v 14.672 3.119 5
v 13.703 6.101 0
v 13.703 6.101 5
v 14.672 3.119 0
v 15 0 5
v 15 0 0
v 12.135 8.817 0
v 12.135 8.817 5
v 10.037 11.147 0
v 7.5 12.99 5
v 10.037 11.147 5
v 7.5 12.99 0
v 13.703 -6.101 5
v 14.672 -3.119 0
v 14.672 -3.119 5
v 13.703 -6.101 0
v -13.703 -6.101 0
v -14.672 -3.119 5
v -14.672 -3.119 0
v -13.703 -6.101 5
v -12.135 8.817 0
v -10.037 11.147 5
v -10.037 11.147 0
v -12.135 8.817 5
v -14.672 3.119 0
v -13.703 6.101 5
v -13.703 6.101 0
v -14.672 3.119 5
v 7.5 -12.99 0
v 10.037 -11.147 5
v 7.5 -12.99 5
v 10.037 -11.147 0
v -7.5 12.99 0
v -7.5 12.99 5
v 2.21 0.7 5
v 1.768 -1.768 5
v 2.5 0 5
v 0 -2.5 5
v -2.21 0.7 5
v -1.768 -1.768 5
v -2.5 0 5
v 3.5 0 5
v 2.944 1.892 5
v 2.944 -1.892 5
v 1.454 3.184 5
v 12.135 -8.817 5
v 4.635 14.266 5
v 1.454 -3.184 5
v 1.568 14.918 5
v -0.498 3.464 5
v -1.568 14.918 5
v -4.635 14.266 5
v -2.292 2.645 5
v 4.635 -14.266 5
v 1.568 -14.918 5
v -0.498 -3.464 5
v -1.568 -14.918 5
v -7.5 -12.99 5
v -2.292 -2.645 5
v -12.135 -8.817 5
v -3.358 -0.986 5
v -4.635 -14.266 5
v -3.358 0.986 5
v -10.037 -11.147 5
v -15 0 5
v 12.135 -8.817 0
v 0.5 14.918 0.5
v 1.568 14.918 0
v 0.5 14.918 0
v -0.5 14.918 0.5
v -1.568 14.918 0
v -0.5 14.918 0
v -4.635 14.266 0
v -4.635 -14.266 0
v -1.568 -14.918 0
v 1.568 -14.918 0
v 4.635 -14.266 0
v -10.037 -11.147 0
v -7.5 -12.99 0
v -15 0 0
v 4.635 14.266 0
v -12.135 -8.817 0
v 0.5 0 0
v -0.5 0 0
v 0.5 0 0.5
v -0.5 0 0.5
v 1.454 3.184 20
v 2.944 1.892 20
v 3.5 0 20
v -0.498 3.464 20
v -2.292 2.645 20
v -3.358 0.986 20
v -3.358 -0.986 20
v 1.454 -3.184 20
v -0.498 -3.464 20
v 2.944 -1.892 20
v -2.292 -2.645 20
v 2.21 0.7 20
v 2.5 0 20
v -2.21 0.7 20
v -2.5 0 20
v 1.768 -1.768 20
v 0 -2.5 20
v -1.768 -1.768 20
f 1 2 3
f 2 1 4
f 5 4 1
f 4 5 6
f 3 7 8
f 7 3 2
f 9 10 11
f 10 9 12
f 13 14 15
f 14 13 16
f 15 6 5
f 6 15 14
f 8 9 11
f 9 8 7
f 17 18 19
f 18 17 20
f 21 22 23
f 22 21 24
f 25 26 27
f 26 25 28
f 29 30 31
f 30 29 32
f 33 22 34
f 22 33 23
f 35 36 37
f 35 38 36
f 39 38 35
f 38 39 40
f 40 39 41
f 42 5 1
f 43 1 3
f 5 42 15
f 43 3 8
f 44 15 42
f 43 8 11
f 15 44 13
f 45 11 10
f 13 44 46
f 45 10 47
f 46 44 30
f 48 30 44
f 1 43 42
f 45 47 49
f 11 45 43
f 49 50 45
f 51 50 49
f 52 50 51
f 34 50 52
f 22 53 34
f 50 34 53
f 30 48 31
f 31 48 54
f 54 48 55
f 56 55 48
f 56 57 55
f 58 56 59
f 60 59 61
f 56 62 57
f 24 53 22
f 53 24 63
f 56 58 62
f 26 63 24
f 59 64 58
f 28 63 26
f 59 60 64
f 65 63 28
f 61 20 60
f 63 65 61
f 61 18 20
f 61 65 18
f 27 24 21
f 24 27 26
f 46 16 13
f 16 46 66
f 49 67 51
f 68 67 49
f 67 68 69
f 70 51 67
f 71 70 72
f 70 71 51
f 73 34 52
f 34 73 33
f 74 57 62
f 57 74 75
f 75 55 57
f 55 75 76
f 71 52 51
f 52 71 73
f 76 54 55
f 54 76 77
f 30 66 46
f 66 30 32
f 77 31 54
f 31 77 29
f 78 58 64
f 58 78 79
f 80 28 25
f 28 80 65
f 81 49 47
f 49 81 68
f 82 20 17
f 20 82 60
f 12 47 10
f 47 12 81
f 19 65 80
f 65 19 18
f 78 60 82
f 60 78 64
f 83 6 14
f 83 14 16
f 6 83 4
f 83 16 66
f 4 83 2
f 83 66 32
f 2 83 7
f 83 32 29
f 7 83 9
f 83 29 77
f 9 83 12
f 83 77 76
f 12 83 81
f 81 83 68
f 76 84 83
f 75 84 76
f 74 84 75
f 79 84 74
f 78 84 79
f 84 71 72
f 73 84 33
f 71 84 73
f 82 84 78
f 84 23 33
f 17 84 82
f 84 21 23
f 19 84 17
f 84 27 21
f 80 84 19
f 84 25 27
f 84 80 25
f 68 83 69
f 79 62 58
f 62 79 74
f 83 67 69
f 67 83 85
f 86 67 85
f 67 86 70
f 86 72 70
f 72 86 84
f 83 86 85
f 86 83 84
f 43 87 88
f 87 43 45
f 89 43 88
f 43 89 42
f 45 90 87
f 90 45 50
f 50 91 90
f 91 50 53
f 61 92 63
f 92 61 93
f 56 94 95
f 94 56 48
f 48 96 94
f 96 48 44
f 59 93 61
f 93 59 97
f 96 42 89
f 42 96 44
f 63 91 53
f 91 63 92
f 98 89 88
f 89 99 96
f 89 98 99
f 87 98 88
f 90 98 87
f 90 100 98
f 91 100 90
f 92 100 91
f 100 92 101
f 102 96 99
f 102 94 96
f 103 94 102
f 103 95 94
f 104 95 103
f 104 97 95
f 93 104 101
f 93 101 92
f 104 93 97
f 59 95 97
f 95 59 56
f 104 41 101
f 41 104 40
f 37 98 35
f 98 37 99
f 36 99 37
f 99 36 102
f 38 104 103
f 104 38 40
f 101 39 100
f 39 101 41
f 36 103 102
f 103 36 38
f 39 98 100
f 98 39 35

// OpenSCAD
knob_thickness = 5;
knob_radius = 15;
knob_line_width = 1;

shaft_length = 15;
shaft_outer_radius = 3.5;
shaft_thickness = 1;
shaft_fill = 0.4;


module knob()
{
    handle(knob_radius, knob_thickness, knob_line_width);

    translate([0,0,knob_thickness]) {
        shaft(shaft_outer_radius, shaft_length, shaft_thickness, shaft_fill);
    }
}

module handle(radius, height, line_width)
{

    difference() {
        cylinder(r=radius, h=height);
        translate([0,radius/2,0]) {
            cube([line_width, radius, line_width], center=true);
        }
    }

}

module shaft(radius, length, wall_thickness, shaft_fill)
{
    difference() {
        cylinder(r=radius, h=length);
        cylinder(r=radius - wall_thickness, h=length+0.1);
    }

    intersection() {
        cylinder(r=radius, h=length);

        translate([-radius,(shaft_fill - 0.5) * -radius*2,0]) {
            cube([radius*2, radius*2, length]);
        }
    }
}

knob();

// Written by John Meagher <3d@jmeagher.net>
//
// To the extent possible under law, the author(s) have dedicated all
// copyright and related and neighboring rights to this software to the
// public domain worldwide. This software is distributed without any
// warranty.
//
// You should have received a copy of the CC0 Public Domain
// Dedication along with this software.
// If not, see <http://creativecommons.org/publicdomain/zero/1.0/>.

                
